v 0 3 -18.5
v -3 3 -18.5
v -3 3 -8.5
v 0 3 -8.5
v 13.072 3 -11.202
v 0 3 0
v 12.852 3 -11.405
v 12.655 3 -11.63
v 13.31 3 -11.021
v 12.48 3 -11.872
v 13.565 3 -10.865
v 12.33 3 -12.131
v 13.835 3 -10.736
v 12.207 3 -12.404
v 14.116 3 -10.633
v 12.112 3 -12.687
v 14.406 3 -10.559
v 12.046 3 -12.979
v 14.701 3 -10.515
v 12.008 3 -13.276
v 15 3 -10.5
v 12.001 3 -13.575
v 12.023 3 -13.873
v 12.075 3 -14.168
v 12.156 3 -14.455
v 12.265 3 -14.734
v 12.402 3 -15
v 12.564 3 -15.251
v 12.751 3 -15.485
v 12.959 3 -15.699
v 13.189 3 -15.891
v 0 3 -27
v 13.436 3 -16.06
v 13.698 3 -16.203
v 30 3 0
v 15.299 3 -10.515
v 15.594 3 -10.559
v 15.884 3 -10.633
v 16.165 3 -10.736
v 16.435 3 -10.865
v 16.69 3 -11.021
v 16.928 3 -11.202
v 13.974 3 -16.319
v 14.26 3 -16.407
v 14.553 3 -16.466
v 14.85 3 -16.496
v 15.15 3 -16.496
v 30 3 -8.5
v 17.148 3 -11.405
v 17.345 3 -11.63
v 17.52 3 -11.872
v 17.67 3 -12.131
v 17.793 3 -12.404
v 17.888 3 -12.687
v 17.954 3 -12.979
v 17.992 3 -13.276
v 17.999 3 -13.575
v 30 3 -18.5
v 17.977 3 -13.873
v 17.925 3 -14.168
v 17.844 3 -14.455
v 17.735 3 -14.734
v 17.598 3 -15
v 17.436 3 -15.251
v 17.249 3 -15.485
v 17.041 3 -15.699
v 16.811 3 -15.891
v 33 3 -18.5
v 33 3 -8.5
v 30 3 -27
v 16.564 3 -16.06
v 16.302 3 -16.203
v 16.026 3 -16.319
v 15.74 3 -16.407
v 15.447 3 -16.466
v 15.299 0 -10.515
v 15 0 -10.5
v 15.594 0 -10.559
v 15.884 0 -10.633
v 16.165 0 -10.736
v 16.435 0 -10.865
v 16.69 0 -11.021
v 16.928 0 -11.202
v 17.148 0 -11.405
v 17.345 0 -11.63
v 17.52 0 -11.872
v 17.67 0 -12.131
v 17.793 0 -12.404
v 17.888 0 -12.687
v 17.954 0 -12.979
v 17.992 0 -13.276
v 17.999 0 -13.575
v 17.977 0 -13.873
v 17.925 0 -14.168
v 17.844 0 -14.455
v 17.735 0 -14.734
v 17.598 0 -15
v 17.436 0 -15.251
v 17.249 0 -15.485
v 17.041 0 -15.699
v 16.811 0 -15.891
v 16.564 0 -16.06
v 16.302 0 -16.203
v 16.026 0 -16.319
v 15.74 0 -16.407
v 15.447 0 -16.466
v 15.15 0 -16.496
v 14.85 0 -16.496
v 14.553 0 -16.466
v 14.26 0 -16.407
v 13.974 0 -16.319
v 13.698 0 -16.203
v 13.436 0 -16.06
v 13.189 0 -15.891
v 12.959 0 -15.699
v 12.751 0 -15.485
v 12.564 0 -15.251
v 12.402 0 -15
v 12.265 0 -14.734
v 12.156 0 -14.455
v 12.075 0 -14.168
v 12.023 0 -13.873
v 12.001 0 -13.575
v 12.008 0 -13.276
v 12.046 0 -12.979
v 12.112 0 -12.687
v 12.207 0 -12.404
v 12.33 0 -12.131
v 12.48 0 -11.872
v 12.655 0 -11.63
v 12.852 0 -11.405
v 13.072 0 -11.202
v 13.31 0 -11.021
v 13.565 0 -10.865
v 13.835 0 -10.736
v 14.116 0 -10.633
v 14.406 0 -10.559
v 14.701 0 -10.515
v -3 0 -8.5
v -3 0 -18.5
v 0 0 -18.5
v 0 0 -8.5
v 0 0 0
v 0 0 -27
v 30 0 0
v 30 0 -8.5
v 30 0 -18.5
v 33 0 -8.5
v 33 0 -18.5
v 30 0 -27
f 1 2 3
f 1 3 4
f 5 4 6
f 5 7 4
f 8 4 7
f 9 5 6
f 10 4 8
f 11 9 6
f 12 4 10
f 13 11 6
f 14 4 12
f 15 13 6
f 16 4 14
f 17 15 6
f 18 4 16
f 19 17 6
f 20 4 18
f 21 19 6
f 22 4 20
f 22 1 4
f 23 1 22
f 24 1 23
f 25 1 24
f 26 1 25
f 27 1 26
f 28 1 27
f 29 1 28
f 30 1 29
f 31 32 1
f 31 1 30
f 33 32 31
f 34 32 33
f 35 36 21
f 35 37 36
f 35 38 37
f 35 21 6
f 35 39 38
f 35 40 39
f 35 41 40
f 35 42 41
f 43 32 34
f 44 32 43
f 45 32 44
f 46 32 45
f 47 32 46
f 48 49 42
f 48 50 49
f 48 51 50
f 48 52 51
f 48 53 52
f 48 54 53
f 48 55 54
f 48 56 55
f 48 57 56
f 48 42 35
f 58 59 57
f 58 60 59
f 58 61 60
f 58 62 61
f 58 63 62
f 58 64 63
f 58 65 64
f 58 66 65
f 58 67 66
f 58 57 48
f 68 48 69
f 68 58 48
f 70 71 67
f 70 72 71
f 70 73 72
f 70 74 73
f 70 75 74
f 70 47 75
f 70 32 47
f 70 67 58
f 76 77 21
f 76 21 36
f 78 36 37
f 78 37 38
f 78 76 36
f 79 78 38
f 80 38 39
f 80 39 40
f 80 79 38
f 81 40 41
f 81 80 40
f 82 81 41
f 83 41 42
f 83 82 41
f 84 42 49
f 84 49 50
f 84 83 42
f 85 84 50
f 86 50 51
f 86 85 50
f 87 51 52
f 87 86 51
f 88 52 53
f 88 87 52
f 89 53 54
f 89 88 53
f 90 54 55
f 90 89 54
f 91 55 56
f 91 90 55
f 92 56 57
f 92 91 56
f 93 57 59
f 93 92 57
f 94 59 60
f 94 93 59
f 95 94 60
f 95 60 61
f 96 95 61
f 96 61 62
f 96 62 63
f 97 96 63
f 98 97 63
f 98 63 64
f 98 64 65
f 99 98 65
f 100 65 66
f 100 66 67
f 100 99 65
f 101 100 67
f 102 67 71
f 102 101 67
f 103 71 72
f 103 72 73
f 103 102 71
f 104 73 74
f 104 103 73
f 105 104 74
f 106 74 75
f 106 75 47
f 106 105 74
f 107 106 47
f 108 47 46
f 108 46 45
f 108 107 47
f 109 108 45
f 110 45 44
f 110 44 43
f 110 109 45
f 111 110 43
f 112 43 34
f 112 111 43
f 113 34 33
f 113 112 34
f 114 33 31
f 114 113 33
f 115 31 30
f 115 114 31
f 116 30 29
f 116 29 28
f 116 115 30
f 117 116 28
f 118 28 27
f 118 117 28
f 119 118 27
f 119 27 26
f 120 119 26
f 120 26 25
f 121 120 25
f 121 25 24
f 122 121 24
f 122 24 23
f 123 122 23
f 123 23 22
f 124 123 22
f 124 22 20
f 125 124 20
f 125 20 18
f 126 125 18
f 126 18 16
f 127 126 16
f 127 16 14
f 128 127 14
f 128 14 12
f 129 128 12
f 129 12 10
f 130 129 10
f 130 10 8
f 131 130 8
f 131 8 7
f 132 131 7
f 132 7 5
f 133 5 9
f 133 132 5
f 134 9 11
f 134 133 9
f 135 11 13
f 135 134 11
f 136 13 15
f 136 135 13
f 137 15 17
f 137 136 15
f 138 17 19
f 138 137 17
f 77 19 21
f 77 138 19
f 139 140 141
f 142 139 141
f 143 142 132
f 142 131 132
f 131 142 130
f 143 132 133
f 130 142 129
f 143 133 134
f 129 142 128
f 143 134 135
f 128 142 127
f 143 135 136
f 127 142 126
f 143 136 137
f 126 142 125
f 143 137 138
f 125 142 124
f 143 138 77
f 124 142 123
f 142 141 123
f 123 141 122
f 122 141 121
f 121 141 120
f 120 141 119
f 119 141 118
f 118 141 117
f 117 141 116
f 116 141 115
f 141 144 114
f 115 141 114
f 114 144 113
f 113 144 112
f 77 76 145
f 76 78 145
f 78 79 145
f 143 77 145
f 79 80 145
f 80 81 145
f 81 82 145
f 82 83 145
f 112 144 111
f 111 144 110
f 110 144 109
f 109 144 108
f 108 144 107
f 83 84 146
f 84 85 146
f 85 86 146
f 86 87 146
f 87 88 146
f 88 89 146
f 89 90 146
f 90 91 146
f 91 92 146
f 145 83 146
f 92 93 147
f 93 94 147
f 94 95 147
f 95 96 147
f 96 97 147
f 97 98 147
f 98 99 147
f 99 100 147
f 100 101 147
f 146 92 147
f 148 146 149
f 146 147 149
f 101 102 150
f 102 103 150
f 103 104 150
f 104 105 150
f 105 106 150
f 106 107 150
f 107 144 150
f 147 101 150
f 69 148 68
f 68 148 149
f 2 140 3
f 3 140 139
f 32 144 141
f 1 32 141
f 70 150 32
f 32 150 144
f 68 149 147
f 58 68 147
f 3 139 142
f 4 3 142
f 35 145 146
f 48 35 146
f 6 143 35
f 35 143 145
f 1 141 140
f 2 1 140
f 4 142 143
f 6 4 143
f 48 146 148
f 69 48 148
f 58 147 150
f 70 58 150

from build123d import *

# Parameters (mm, degrees)
CROQUIS1_R              = 3
SALIENTE_EXTRUIR1_DEPTH = 3


with BuildPart() as part:
    # Croquis1 → Saliente-Extruir1 (new body)
    with BuildSketch(Plane(origin=(0, 0, 0), x_dir=(1, 0, 0), z_dir=(0, 1, 0))):
        Polygon((0, 0), (30, 0), (30, 8.5), (33, 8.5), (33, 13.5), (33, 18.5), (30, 18.5), (30, 27), (0, 27), (0, 18.5), (-3, 18.5), (-3, 13.5), (-3, 8.5), (0, 8.5), align=None)
        with Locations(Location((15, 13.5, 0), (0, 0, 270))):
            Circle(CROQUIS1_R, mode=Mode.SUBTRACT)
    extrude(amount=SALIENTE_EXTRUIR1_DEPTH)


solid = part.part
